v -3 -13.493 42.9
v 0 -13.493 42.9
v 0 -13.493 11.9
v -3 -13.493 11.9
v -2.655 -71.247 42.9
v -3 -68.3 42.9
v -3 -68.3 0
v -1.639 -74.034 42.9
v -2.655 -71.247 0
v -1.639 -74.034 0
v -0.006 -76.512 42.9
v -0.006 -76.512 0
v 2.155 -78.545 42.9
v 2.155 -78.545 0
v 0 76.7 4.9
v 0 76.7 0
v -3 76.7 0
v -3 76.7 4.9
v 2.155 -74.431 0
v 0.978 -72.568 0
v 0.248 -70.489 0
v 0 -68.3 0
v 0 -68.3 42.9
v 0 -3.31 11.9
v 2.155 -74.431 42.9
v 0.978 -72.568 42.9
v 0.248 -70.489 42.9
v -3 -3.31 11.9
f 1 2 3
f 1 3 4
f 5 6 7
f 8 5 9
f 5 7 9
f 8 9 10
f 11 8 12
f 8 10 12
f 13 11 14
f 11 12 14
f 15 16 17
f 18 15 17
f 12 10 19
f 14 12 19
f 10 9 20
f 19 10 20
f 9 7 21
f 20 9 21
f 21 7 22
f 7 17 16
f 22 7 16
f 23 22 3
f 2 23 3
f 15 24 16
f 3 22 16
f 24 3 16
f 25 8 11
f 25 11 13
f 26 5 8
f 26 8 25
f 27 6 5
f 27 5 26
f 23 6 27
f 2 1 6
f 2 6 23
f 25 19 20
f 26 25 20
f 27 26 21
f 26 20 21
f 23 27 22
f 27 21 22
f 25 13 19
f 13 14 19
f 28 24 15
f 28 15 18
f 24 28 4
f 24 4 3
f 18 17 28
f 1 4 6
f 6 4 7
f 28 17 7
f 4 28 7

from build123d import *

# Parameters (mm, degrees)
F1_DEPTH = 11.9
F3_DEPTH = 31
F4_SIZE2 = 80.0103661193
F4_SIZE  = 7


with BuildPart() as f1:
    # F0 (on Top) → F1 (new body)
    with BuildSketch(Plane.XY):
        with BuildLine():
            Line((0, 76.7002296448), (-3, 76.7002296448))
            Line((-3, 76.7002296448), (-3, -68.2997703552))
            ThreePointArc((-3, -68.2997703552), (-1.6386286937, -74.0342530307), (2.1549561061, -78.5449445248))
            Line((2.1549561061, -78.5449445248), (2.1549561061, -74.430949986))
            ThreePointArc((2.1549561061, -74.430949986), (0.554422627, -71.5492010547), (0, -68.2997703552))
            Line((0, -68.2997703552), (0, 76.7002296448))
        make_face()
    extrude(amount=F1_DEPTH)

    # F2 (on face) → F3 (join)
    with BuildSketch(Plane.XY.offset(11.9)):
        with BuildLine():
            Line((0, -13.4931067005), (-3, -13.4931067005))
            Line((-3, -13.4931067005), (-3, -68.2997703552))
            ThreePointArc((-3, -68.2997703552), (-1.6386286937, -74.0342530307), (2.1549561061, -78.5449445248))
            Line((2.1549561061, -78.5449445248), (2.1549561061, -74.430949986))
            ThreePointArc((2.1549561061, -74.430949986), (0.554422627, -71.5492010547), (0, -68.2997703552))
            Line((0, -68.2997703552), (0, -13.4931067005))
        make_face()
    extrude(amount=F3_DEPTH)

    # F4
    f4_edges = [f1.edges().sort_by_distance(p)[0] for p in [
        (-1.5, 76.70023, 11.9),
    ]]
    f4_side = f1.faces().sort_by_distance((-1.5, 76.70023, 5.95))[0]
    chamfer(f4_edges, length=F4_SIZE, length2=F4_SIZE2, reference=f4_side)


solid = f1.part
